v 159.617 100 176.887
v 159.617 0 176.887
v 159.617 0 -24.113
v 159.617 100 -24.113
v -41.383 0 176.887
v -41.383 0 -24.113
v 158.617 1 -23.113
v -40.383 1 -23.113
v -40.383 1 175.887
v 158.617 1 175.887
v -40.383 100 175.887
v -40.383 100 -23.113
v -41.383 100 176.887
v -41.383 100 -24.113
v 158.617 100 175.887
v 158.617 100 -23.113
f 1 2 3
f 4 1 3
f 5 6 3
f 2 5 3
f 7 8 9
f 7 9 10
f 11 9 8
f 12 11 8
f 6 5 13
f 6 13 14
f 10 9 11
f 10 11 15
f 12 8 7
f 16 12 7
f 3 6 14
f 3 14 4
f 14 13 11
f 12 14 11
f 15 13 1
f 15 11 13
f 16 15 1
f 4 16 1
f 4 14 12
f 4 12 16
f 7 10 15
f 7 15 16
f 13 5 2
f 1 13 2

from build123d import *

# Parameters (mm, degrees)
CROQUIS1_W              = 201
CROQUIS1_H              = 201
SALIENTE_EXTRUIR1_DEPTH = 100
VACIADO1_T              = -1


with BuildPart() as part:
    # Croquis1 → Saliente-Extruir1 (new body)
    with BuildSketch(Plane(origin=(0, 0, 0), x_dir=(1, 0, 0), z_dir=(0, 1, 0))):
        with Locations((59.116890843, -76.386715501)):
            Rectangle(CROQUIS1_W, CROQUIS1_H)
    extrude(amount=SALIENTE_EXTRUIR1_DEPTH)

    # Vaciado1
    vaciado1_openings = [part.faces().sort_by_distance(p)[0] for p in [
        (59.116890843, 100, 76.386715501),
    ]]
    offset(amount=VACIADO1_T, openings=vaciado1_openings, kind=Kind.INTERSECTION)


solid = part.part
